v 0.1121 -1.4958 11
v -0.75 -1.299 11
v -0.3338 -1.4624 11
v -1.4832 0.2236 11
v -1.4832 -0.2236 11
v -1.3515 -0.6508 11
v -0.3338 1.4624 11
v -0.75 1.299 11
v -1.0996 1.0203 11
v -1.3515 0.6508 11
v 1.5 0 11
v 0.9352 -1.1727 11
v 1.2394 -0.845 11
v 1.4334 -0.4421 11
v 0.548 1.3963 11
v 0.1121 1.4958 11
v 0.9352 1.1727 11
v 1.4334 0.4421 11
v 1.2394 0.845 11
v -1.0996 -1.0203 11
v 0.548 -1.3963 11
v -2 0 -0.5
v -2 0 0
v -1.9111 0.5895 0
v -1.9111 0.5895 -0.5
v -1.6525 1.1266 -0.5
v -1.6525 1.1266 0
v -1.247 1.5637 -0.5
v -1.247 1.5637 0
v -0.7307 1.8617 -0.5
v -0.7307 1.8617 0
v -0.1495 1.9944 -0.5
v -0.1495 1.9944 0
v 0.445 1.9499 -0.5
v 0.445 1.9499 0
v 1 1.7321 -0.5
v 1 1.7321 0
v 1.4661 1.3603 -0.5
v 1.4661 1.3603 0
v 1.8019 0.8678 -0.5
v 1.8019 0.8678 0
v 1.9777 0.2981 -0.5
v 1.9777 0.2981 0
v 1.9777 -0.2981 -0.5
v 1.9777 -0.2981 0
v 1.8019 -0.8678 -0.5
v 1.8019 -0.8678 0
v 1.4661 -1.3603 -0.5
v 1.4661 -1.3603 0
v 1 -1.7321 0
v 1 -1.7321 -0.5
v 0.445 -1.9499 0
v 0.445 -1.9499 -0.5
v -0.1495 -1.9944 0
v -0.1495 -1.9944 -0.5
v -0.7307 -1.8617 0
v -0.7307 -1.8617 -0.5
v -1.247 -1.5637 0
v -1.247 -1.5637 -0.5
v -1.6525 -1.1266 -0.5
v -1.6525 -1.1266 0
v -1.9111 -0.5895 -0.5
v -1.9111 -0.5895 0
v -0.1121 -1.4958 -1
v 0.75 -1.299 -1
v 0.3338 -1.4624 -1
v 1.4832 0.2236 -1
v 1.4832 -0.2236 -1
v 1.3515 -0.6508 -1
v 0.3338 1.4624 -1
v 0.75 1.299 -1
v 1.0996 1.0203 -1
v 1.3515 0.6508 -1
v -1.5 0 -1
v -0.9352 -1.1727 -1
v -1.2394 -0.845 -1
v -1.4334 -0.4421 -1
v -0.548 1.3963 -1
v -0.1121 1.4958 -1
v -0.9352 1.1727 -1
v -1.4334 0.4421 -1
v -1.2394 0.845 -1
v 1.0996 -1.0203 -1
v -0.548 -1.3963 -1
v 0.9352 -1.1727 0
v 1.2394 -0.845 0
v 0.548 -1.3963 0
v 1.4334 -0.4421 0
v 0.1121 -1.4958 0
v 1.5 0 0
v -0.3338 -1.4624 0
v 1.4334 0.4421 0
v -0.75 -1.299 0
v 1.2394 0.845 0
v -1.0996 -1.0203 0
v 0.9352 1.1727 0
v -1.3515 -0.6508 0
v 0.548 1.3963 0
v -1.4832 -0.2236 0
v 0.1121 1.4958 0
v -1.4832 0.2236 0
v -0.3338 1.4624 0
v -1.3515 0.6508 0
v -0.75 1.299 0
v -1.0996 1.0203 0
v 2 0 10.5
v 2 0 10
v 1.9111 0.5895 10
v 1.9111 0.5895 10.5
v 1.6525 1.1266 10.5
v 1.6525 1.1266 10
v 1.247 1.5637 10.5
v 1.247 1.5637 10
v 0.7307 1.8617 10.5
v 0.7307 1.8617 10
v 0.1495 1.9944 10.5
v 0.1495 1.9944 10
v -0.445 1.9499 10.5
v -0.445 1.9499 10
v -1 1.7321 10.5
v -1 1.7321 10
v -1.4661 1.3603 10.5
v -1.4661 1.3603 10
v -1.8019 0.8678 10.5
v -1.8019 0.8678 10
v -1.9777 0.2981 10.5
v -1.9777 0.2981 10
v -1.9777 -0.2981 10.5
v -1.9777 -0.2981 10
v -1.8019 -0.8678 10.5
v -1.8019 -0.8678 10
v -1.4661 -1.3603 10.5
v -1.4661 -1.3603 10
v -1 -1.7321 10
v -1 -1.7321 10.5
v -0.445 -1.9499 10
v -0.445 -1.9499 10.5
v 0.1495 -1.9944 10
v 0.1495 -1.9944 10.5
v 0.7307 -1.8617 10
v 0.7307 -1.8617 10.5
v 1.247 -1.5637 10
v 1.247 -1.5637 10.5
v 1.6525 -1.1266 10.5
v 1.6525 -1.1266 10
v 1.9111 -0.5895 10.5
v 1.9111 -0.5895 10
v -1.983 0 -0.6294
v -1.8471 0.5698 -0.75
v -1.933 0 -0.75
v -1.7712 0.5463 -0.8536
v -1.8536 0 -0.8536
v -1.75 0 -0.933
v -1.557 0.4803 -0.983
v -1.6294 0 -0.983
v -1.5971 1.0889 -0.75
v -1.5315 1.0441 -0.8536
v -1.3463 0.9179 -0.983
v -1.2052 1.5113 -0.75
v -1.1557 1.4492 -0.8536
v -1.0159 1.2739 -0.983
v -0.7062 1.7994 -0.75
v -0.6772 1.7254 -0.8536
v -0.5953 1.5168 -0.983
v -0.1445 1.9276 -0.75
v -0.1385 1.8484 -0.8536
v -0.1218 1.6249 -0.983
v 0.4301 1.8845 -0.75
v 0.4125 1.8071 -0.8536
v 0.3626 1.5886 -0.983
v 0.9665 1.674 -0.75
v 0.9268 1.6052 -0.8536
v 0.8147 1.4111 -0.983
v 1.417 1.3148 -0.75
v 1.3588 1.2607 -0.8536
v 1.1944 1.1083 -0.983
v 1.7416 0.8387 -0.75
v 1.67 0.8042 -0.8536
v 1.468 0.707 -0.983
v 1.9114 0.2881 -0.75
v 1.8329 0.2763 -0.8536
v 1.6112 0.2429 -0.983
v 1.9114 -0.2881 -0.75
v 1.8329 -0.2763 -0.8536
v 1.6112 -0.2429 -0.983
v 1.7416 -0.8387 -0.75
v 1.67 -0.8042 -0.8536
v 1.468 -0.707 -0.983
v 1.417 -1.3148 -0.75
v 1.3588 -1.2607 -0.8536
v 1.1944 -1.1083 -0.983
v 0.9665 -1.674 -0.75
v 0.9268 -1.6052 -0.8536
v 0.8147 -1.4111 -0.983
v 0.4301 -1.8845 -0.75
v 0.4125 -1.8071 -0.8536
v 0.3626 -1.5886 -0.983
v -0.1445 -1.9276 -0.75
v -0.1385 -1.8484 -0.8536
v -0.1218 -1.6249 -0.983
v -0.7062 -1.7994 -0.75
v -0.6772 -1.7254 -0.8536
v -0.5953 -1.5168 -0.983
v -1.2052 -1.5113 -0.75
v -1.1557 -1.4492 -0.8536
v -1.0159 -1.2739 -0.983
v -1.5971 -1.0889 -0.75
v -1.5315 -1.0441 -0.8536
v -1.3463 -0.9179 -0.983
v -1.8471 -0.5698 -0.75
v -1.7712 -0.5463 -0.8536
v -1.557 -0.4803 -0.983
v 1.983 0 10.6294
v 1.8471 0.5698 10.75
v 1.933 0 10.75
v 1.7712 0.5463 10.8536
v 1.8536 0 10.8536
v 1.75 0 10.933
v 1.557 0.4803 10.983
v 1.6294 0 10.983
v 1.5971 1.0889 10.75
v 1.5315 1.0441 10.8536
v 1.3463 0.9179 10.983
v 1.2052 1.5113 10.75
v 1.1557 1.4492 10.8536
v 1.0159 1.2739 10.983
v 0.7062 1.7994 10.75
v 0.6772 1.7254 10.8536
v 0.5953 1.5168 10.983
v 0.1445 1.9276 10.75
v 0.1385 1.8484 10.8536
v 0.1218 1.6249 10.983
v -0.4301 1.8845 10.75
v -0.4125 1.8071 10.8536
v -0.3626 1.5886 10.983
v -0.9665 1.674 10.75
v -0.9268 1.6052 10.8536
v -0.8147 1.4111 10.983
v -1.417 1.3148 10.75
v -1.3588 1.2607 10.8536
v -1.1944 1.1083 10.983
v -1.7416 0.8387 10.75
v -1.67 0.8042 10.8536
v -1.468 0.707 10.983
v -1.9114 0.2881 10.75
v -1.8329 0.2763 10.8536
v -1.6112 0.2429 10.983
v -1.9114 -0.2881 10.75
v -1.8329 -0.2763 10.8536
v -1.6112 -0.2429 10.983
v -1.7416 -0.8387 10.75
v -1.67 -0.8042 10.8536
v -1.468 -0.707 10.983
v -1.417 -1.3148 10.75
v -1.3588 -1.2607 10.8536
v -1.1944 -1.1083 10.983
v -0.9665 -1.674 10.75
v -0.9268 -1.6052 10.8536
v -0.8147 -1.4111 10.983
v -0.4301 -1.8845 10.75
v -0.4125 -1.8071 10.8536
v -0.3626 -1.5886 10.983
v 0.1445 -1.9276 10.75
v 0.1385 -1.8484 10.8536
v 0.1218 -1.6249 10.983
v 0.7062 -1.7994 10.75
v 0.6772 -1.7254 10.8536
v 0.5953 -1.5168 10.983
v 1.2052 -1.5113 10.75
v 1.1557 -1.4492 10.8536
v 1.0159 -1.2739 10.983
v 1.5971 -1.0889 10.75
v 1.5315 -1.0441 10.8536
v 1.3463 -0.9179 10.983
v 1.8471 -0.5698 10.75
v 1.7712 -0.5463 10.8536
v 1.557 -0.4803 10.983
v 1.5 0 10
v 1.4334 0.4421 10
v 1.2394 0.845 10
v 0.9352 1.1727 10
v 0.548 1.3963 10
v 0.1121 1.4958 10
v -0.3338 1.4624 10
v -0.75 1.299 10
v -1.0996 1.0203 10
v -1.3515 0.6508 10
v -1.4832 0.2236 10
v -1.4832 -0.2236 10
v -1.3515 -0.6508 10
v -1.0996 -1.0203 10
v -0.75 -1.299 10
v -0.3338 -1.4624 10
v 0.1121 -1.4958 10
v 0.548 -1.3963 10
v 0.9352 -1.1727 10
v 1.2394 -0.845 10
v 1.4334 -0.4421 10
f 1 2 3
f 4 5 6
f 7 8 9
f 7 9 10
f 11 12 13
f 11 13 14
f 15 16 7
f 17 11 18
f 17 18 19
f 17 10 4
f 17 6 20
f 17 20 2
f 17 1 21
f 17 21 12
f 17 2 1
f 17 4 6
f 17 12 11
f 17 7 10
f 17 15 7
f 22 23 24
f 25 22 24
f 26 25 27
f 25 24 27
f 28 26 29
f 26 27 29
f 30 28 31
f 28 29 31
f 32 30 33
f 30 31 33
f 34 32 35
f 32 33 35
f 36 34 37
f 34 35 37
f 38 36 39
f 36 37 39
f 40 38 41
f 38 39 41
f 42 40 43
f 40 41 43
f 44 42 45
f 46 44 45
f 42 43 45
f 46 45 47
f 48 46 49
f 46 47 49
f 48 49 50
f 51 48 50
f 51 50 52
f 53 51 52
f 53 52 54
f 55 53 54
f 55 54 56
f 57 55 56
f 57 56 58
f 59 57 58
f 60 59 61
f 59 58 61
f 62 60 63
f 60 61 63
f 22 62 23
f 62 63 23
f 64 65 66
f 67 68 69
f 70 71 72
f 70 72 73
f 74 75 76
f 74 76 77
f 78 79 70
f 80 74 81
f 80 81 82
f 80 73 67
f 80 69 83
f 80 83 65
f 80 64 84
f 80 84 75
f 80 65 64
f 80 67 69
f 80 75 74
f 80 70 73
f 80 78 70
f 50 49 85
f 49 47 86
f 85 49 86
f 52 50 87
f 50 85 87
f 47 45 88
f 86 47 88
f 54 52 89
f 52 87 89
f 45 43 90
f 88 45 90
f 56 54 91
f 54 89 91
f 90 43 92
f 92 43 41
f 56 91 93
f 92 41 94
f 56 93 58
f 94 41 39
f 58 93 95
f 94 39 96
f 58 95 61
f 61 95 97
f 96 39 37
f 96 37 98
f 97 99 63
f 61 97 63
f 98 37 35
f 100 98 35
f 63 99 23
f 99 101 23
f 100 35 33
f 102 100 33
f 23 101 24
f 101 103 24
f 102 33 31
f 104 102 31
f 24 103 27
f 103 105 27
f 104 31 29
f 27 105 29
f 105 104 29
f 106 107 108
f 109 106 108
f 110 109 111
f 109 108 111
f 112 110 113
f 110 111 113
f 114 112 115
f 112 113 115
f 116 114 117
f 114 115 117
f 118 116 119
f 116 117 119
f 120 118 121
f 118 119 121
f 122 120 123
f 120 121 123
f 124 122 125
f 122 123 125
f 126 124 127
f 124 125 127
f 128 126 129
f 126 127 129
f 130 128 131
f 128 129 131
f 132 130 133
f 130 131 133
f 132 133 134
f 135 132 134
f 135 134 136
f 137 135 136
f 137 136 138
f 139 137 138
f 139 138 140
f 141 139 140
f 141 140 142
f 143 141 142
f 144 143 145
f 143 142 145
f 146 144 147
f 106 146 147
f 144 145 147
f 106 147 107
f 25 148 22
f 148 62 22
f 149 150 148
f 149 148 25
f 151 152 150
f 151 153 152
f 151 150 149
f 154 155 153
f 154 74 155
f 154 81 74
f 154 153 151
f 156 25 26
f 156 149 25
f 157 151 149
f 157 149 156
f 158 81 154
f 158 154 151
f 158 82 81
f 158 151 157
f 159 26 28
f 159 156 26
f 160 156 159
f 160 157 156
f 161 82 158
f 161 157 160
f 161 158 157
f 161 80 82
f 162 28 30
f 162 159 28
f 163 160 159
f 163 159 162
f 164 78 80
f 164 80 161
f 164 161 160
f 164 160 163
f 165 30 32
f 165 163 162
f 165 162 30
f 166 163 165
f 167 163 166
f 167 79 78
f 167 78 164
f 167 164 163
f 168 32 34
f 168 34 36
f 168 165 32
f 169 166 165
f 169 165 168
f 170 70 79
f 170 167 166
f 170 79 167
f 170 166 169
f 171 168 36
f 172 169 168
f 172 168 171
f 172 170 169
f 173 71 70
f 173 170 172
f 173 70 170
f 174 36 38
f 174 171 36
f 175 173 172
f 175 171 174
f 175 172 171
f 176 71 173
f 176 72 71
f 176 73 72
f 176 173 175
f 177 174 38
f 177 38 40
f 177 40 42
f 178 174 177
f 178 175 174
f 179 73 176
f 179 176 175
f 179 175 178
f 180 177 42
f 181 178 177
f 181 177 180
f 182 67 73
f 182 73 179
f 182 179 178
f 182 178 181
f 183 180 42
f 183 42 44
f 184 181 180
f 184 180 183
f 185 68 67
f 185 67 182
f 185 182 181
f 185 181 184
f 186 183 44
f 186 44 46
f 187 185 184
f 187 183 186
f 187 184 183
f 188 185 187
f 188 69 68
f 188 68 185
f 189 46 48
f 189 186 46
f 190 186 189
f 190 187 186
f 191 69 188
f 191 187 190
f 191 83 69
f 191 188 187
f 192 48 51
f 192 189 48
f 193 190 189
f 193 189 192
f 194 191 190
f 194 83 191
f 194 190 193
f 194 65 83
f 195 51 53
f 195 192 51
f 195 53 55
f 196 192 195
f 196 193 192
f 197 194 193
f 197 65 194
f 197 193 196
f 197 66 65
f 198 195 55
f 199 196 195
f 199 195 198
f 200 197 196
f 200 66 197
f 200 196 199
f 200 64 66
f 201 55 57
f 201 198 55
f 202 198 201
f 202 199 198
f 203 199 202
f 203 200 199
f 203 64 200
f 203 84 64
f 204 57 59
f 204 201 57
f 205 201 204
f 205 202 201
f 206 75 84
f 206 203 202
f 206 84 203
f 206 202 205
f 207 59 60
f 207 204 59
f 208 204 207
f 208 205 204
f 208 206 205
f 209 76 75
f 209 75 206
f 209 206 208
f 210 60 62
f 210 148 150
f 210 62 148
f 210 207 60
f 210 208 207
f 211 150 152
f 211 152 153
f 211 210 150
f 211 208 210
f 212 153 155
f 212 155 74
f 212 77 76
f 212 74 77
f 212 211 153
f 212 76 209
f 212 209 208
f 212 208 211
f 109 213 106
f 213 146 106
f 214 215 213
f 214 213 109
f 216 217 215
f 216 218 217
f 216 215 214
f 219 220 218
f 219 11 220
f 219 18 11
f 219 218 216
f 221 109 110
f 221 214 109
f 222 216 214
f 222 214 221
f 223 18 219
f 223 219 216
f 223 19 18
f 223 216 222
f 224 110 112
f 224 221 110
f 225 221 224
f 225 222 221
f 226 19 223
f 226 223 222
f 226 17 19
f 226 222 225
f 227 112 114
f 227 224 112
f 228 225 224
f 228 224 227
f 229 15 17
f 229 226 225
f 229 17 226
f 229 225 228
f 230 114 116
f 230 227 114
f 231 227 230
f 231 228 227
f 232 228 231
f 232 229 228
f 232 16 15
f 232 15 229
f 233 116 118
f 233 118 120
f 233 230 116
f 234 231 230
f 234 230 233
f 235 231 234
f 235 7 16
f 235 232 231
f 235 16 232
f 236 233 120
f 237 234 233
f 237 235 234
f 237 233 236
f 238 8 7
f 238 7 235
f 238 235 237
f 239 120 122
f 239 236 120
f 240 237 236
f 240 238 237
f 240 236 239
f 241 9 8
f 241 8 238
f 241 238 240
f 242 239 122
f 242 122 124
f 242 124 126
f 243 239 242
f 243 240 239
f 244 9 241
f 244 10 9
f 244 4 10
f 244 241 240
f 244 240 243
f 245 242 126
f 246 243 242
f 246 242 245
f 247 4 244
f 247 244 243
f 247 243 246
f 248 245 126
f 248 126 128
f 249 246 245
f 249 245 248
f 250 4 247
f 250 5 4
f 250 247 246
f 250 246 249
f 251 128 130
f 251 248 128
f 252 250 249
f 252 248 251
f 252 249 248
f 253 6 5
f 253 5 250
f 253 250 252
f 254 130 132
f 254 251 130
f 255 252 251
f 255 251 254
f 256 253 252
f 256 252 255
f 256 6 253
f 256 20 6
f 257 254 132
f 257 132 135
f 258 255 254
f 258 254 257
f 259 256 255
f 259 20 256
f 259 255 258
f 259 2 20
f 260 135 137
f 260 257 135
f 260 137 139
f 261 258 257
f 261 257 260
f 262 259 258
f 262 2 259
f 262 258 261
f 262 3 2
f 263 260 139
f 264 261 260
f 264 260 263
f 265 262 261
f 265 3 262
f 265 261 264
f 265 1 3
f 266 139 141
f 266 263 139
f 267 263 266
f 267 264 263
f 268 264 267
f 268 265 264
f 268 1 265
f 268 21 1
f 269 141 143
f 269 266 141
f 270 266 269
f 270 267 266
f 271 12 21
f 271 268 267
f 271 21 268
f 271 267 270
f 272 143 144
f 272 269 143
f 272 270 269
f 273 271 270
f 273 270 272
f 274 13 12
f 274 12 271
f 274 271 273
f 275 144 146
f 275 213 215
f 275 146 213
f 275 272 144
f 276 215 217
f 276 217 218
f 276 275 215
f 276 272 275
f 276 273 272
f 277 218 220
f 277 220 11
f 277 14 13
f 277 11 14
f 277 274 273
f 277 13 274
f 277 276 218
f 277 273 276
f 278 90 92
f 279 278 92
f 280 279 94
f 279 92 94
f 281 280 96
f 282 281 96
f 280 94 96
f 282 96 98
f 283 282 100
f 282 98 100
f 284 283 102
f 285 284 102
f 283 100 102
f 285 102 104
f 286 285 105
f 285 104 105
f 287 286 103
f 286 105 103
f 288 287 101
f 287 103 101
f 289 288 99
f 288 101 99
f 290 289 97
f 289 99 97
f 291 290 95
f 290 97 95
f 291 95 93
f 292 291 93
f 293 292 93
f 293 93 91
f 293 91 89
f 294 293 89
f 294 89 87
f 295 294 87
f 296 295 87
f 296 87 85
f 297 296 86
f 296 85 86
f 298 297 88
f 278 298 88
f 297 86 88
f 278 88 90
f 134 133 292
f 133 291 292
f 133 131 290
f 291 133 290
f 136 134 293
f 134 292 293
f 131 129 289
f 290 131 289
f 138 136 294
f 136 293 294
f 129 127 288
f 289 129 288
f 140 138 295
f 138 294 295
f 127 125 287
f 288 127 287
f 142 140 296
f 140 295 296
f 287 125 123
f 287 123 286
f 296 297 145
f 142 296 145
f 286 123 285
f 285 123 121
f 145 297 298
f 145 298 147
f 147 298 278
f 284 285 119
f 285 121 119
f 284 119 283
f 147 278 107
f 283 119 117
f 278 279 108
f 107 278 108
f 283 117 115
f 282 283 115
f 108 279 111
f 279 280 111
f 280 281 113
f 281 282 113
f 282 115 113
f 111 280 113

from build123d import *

# Parameters (mm, degrees)
SKETCH1_R           = 1.5
BOSS_EXTRUDE1_DEPTH = 10
SKETCH2_R           = 2
BOSS_EXTRUDE2_DEPTH = 1
SKETCH3_R           = 2
BOSS_EXTRUDE3_DEPTH = 1
FILLET1_R           = 0.5


with BuildPart() as part:
    # Sketch1 → Boss-Extrude1 (new body)
    with BuildSketch(Plane.XY):
        Circle(SKETCH1_R)
    extrude(amount=BOSS_EXTRUDE1_DEPTH)

    # Sketch2 → Boss-Extrude2 (add)
    with BuildSketch(Plane(origin=(0, 0, 0), x_dir=(-1, 0, 0), z_dir=(0, 0, -1))):
        Circle(SKETCH2_R)
    extrude(amount=BOSS_EXTRUDE2_DEPTH)

    # Sketch3 → Boss-Extrude3 (add)
    with BuildSketch(Plane.XY.offset(10)):
        Circle(SKETCH3_R)
    extrude(amount=BOSS_EXTRUDE3_DEPTH)

    # Fillet1
    fillet1_edges = [part.edges().sort_by_distance(p)[0] for p in [
        (-2, 0, 11),
        (2, 0, -1),
    ]]
    fillet(fillet1_edges, radius=FILLET1_R)


solid = part.part
